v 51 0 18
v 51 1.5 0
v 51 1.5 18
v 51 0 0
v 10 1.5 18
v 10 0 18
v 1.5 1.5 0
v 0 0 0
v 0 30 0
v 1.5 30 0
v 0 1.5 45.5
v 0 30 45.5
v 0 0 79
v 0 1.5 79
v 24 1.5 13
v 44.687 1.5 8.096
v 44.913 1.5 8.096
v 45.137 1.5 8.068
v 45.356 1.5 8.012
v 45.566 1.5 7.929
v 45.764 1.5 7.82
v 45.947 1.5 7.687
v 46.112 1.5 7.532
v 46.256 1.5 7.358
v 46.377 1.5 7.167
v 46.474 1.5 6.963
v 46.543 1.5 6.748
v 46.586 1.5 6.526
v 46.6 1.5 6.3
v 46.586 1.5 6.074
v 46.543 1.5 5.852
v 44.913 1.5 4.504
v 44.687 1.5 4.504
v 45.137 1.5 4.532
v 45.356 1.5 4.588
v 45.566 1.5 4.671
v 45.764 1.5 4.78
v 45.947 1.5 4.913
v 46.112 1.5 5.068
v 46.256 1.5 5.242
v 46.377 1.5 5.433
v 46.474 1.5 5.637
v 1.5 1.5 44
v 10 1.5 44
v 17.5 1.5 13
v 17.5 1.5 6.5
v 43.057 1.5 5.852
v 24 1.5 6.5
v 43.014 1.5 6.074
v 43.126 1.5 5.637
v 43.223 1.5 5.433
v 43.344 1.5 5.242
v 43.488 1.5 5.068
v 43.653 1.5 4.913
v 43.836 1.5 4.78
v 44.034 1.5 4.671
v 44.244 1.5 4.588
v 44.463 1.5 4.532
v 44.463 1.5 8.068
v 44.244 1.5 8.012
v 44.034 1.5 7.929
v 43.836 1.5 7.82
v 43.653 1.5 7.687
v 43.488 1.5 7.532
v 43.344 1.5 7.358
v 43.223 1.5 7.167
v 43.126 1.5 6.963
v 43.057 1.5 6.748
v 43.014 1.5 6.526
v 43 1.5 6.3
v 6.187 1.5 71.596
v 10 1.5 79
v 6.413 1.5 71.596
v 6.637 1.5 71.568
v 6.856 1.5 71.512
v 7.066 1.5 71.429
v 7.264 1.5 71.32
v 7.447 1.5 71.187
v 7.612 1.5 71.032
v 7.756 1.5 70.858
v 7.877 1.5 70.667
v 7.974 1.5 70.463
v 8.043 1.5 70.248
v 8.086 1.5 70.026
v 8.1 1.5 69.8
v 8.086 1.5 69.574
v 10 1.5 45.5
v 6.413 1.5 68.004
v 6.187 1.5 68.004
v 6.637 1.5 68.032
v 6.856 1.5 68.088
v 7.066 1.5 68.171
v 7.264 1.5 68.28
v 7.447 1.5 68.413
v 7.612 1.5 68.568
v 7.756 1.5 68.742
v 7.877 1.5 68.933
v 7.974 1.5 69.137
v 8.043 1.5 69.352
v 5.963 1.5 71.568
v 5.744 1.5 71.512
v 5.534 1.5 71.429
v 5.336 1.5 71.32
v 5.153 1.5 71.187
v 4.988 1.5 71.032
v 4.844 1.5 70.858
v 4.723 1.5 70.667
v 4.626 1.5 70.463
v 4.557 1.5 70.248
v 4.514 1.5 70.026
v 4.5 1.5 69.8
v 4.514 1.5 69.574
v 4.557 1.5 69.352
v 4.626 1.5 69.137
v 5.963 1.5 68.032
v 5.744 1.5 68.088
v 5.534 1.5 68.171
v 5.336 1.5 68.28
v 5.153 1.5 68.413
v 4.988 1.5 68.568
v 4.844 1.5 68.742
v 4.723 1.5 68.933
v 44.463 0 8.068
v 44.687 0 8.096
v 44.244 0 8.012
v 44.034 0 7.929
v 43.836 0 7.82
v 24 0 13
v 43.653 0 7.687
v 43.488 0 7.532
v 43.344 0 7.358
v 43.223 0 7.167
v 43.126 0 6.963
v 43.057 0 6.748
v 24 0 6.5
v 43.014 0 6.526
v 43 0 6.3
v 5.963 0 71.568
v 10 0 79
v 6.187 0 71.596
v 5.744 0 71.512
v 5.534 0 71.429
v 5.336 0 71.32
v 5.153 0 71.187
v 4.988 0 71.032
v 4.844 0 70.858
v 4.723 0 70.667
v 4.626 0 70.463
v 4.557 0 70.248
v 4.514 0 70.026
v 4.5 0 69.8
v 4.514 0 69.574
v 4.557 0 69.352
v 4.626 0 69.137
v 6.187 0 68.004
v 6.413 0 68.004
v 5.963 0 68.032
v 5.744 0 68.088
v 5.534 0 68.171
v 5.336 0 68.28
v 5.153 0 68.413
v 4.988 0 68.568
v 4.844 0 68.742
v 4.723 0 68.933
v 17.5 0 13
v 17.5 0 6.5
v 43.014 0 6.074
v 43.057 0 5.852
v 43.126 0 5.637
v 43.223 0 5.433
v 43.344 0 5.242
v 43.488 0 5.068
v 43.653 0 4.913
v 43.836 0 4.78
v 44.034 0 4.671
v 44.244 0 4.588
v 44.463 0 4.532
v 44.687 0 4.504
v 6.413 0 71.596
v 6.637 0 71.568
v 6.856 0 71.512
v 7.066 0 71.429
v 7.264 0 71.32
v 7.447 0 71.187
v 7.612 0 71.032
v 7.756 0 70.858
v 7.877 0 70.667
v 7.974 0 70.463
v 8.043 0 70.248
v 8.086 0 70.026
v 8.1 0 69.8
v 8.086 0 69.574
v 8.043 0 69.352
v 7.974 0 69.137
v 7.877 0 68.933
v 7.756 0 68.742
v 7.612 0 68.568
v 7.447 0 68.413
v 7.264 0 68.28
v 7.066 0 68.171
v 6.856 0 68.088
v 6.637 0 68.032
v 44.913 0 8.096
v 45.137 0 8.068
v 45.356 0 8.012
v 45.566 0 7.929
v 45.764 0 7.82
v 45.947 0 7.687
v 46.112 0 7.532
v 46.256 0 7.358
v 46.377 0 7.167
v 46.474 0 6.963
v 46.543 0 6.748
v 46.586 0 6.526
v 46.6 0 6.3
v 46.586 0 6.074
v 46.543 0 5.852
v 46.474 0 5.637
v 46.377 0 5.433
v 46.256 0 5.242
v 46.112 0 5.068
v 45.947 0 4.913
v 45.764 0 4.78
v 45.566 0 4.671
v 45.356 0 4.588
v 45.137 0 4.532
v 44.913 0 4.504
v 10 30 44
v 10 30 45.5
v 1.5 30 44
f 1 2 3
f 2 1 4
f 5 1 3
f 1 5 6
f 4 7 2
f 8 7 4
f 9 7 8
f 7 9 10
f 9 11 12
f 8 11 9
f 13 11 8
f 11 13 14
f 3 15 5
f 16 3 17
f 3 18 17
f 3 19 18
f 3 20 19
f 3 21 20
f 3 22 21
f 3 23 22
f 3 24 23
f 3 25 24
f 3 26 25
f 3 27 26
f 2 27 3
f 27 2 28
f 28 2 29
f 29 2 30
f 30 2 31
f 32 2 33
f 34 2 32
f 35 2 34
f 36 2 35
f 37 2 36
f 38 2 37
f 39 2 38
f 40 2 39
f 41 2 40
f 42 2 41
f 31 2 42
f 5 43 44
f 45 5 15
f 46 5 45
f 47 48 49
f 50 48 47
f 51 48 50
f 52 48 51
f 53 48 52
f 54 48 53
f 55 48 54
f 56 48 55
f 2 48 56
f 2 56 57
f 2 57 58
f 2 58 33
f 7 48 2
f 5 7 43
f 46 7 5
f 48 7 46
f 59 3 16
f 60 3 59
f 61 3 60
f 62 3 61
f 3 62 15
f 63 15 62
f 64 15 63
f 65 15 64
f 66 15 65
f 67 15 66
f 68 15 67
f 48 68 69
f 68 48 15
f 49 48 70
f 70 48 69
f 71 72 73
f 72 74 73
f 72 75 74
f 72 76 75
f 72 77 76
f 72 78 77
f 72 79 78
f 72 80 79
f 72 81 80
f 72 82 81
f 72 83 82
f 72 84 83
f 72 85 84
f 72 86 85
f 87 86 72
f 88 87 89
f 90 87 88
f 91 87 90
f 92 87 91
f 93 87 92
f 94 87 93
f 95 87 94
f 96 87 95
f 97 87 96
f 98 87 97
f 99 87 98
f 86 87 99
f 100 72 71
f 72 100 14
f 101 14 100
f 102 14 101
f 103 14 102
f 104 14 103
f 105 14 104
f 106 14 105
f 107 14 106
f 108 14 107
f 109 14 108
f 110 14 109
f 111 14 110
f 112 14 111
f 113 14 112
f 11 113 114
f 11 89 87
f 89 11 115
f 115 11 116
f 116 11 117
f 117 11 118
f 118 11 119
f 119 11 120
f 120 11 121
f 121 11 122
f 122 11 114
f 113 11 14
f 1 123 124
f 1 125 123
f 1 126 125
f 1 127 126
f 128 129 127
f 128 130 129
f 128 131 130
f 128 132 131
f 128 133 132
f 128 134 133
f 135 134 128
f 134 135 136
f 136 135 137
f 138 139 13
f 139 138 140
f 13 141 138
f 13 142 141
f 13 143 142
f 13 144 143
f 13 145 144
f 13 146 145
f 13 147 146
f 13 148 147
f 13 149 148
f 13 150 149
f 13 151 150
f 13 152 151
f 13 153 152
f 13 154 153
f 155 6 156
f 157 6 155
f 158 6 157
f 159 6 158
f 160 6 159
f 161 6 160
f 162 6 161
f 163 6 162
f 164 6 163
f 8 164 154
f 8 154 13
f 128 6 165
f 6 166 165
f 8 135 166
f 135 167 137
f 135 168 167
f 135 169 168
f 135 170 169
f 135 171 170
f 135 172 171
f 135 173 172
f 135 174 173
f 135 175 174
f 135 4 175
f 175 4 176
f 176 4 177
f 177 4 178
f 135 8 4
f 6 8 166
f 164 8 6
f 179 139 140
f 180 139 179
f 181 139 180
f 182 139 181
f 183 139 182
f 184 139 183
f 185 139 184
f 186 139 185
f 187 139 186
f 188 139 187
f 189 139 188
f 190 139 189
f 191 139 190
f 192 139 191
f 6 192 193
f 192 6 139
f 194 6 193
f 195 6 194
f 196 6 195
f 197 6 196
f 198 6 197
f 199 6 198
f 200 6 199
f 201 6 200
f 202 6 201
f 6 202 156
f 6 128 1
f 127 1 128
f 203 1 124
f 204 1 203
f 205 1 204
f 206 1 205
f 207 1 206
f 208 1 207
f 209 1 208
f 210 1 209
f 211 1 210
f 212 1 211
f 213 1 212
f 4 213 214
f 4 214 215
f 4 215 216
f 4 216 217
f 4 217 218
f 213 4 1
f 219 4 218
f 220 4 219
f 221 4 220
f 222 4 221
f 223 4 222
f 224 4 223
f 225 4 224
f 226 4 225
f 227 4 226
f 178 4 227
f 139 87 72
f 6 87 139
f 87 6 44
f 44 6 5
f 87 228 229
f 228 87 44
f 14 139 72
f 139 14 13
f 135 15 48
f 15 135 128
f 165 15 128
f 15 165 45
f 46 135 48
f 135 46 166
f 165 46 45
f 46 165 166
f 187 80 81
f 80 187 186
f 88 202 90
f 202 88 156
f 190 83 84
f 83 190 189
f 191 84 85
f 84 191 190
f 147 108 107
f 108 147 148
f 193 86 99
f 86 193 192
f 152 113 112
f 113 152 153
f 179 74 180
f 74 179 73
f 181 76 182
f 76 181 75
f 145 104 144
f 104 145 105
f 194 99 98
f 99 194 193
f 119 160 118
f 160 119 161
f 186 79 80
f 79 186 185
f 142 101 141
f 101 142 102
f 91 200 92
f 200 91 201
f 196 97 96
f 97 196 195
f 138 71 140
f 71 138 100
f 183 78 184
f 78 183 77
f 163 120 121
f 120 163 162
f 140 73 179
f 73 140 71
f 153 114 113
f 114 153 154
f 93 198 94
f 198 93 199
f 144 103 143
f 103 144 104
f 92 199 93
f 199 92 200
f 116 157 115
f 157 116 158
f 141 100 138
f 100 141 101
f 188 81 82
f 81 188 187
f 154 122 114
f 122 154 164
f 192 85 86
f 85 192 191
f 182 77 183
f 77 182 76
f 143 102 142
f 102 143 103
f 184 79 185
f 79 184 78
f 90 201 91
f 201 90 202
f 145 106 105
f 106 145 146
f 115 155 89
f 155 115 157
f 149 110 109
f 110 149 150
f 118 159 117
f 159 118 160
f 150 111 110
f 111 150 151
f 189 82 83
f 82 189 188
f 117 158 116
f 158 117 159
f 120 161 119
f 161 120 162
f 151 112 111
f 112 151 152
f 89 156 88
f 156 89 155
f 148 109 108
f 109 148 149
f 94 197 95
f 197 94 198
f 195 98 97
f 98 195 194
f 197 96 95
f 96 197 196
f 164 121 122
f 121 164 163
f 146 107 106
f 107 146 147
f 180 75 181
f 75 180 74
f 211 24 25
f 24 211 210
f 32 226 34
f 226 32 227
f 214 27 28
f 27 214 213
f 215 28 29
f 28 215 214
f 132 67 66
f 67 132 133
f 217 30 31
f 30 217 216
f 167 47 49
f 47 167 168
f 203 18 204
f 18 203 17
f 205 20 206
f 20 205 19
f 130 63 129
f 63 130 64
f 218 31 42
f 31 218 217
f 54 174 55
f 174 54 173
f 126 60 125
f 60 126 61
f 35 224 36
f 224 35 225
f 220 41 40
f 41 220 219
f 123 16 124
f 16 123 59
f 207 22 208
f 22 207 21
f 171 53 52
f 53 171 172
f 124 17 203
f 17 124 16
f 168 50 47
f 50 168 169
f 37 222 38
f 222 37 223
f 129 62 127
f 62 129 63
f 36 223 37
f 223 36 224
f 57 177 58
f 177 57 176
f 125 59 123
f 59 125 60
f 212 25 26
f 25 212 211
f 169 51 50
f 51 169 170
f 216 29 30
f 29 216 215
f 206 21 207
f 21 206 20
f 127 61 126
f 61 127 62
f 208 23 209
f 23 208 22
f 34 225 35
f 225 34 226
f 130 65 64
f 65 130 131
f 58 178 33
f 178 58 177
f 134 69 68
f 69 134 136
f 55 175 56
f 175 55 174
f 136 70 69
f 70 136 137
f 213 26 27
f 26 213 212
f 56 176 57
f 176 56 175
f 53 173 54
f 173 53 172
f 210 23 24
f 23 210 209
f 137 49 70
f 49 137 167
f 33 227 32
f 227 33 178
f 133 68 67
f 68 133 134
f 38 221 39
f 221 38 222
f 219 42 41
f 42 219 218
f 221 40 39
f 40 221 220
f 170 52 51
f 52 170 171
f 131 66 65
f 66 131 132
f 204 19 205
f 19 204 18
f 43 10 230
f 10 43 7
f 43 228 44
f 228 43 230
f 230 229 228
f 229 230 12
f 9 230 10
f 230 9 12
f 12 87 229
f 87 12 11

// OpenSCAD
// A3000 Power Button Bracket

// Dimensions
base_long = 79; // Long edge of the L
base_short = 51; // Short edge of the L
wall_height = 30; // Height of the vertical wall
wall_width = 44; // Width of the vertical wall
hole_diameter = 3.6; // Diameter of circular holes (approximate)
square_hole_size = 6.5; // Size of square cutout
tab_width = 15; // Width of the bent tab
tab_height = 8; // Height of the bent tab (approximate)
tab_offset = 20; // Offset from one edge

vertical_wall_offset = 0; // Original metal piece has one piece
                          // floating but if you print this on
                          // an FDM printer, set it to zero.

thickness = 1.5;          // Material thickness. Original is about 1.5mm

module base_plate() {
    difference() {
        union() {
            cube([base_short, thickness, 18]); // Base plate
            cube([10,thickness,base_long]);
        }

        // Square cutout
        translate([17.5, -0.1, 6.5]) 
            cube([square_hole_size, thickness+0.2, square_hole_size]);

        // Circular holes
        translate([4.5+hole_diameter/2, thickness+0.1, 68+hole_diameter/2]) 
          rotate([90, 0, 0]) 
            cylinder(h=2, d=hole_diameter, $fn=50);
        
        translate([43+hole_diameter/2, thickness+0.1, 4.5+hole_diameter/2]) 
          rotate([90, 0, 0]) 
            cylinder(h=2, d=hole_diameter, $fn=50);
        
    }
}

module vertical_wall() {
    cube([thickness, wall_height, wall_width]); // Vertical wall
    translate([0, vertical_wall_offset, wall_width])
        cube([10, wall_height-vertical_wall_offset, thickness]);
}

module bracket() {
    union() {
        base_plate();
        vertical_wall();
       // tab();
    }
}

color ("#cccccc")
bracket();
